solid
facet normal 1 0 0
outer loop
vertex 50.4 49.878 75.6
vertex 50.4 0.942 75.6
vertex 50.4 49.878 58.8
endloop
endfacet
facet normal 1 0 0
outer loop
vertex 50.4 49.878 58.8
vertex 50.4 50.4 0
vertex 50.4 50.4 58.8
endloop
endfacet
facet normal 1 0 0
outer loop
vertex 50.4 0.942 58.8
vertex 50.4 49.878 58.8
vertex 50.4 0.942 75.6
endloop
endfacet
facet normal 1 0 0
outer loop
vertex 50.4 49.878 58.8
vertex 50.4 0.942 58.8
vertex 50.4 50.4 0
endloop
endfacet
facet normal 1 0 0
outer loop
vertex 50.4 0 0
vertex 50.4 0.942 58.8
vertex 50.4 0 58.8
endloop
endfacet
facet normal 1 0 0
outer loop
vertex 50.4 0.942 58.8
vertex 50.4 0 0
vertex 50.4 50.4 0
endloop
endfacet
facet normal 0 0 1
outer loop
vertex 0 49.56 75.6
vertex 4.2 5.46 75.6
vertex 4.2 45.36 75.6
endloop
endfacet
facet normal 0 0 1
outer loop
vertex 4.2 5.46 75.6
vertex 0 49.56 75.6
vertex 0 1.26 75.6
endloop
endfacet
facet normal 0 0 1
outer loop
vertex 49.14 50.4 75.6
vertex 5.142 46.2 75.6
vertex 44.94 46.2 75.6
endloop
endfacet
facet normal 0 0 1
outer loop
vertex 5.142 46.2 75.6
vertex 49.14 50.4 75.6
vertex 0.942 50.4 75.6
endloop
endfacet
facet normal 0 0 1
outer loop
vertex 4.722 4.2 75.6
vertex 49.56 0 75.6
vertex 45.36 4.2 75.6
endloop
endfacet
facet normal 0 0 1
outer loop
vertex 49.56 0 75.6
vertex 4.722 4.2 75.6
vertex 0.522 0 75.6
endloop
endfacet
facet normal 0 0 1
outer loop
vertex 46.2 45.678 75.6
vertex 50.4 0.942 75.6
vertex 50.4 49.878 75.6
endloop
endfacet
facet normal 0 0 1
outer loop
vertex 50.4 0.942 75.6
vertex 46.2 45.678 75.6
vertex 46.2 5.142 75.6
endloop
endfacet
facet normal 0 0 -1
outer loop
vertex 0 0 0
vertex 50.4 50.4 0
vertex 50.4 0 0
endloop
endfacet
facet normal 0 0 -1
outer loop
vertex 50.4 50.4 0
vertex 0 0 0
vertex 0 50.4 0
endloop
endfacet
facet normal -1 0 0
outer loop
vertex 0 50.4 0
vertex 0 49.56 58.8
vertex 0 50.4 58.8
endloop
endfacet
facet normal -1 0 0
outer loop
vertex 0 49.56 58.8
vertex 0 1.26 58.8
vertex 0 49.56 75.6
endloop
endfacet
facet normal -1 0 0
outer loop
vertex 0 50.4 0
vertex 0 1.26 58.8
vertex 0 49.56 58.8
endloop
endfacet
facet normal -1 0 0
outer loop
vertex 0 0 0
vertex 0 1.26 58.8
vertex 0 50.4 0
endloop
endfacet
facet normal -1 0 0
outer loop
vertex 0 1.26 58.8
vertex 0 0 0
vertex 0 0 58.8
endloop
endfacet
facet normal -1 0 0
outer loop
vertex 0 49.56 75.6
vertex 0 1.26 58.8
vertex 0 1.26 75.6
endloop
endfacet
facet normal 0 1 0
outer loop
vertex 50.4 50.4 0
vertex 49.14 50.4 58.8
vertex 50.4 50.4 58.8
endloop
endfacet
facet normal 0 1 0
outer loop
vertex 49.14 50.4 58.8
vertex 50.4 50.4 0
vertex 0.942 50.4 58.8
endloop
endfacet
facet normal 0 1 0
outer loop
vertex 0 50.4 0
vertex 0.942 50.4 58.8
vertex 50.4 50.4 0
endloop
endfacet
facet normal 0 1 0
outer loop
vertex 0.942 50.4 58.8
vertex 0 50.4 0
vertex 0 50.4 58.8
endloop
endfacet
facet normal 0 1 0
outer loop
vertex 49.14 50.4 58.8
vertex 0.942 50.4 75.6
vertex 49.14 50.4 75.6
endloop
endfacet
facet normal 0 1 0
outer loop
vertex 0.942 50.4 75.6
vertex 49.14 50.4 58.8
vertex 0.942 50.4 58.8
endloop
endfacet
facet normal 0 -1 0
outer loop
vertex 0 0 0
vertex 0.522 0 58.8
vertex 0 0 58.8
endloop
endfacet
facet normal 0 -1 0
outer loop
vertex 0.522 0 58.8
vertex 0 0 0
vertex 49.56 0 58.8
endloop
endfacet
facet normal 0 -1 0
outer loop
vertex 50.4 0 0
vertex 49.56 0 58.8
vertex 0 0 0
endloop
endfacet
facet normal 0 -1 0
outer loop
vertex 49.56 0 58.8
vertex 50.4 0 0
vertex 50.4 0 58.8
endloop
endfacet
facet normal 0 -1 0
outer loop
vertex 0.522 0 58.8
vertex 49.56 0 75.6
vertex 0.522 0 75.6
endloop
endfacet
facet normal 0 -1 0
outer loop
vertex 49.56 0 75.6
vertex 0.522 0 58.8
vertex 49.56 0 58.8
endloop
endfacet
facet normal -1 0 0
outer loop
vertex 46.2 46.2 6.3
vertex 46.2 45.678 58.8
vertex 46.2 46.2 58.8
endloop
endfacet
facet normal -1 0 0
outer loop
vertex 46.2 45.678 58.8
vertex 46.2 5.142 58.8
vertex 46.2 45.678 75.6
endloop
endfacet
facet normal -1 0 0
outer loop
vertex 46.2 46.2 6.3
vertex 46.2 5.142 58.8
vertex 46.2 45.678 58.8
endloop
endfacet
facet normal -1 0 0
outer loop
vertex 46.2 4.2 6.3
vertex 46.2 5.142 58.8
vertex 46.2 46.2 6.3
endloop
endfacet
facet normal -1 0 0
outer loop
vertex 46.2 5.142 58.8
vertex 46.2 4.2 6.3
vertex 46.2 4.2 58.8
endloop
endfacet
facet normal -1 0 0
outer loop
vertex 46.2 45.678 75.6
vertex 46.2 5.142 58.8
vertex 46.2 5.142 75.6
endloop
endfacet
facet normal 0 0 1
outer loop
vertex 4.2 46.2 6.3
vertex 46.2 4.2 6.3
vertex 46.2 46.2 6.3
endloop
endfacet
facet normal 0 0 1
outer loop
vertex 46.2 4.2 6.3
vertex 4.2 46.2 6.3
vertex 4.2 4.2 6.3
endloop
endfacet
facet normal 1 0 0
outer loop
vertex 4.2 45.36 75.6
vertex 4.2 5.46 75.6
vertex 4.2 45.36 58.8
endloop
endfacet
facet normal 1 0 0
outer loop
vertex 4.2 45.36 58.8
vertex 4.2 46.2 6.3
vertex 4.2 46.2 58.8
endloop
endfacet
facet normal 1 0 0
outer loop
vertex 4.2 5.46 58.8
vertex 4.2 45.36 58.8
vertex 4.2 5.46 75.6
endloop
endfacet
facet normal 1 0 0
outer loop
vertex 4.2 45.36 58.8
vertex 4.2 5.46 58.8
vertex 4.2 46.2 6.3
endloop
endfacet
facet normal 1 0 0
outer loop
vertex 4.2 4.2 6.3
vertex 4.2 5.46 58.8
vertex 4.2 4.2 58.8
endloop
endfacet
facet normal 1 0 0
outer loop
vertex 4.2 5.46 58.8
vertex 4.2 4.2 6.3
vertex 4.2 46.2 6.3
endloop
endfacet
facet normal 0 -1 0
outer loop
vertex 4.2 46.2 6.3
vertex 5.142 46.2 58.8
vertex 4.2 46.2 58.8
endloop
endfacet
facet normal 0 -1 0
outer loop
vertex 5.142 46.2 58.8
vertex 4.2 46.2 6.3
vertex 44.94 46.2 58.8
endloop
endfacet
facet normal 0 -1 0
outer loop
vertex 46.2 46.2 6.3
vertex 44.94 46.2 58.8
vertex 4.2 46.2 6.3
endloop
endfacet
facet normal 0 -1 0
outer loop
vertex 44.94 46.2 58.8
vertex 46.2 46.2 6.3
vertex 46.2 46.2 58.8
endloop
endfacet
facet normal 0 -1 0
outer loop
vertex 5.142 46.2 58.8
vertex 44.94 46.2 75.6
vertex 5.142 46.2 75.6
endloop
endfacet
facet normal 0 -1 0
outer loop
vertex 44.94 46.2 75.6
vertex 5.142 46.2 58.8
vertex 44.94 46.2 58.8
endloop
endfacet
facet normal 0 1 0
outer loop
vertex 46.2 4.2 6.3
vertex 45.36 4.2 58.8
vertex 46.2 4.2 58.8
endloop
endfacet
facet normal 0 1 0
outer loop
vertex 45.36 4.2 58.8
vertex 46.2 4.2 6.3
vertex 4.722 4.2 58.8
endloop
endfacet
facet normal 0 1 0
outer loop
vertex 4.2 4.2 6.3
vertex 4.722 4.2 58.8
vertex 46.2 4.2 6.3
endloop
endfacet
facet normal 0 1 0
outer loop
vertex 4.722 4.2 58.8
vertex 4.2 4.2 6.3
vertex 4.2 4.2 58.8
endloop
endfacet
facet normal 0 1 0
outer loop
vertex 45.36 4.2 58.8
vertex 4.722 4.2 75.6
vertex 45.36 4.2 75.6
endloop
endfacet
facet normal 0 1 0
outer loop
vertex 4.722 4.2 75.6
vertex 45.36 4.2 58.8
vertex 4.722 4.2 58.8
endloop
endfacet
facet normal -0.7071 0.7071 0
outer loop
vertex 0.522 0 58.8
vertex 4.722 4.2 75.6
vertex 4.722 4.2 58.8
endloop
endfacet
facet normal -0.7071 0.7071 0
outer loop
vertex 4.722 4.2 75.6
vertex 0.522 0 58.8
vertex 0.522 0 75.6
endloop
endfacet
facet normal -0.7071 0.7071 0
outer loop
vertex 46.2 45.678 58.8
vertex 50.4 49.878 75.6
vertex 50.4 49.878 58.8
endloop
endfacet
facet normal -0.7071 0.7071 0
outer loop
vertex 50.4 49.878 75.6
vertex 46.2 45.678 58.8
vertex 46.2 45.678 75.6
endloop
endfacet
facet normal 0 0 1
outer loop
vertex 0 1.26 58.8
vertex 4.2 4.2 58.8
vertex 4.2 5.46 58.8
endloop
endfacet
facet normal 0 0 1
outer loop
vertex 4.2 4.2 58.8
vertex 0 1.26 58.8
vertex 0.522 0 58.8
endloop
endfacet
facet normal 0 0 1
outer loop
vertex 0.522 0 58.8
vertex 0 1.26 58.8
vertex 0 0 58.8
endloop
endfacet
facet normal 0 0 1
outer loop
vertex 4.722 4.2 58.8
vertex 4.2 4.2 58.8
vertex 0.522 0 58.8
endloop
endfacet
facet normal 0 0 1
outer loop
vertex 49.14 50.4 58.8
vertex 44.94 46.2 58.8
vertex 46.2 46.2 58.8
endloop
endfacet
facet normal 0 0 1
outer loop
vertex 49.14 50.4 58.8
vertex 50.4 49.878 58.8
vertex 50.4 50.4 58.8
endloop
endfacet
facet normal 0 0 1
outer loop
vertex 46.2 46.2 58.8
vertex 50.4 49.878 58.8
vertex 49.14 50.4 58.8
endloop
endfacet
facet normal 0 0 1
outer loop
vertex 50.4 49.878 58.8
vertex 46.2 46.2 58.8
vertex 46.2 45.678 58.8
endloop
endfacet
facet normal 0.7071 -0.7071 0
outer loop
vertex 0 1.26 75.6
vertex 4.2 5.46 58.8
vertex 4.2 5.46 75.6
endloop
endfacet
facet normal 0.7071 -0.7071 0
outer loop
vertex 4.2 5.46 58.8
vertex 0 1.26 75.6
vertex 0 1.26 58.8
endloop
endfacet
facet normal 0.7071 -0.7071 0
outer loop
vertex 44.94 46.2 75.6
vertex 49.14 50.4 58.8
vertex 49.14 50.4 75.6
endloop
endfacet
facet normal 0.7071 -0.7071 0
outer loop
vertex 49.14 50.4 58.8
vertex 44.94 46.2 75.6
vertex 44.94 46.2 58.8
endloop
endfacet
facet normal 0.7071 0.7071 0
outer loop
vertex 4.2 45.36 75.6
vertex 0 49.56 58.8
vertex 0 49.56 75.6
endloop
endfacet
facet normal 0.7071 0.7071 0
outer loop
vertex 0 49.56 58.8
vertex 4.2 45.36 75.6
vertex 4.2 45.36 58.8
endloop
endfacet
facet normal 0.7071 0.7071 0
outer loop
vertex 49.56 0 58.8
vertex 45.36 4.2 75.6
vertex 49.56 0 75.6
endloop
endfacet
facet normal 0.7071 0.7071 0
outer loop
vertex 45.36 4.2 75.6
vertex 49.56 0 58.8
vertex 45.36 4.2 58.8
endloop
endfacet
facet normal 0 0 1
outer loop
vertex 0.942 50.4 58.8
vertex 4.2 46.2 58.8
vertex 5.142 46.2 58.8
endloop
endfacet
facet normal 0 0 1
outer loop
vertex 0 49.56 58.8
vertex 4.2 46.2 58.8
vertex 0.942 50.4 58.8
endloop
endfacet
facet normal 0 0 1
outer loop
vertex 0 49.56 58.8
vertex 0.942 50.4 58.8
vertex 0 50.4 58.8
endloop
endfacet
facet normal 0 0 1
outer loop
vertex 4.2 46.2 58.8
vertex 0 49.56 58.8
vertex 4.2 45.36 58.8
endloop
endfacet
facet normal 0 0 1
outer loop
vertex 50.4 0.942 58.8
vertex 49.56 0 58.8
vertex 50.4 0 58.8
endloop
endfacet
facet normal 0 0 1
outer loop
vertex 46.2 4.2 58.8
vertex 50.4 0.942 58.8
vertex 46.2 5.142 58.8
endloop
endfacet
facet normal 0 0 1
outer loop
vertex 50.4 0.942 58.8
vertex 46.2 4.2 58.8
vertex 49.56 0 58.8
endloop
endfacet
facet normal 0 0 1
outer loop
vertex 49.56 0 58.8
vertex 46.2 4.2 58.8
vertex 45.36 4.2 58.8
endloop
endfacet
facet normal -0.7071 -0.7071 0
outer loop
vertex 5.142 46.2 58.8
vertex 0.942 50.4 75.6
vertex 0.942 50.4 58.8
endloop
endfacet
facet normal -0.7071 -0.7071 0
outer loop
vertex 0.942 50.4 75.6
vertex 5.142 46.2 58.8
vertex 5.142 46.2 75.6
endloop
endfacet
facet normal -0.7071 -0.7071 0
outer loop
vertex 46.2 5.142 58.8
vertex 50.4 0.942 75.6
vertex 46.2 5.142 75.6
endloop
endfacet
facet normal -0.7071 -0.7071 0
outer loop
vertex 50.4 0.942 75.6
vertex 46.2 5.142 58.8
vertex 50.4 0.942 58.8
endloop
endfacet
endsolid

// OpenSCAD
$fn=50;

scale([4.2, 4.2, 4.2]) {
    color("#1a1203") {
        difference() {
            cube([12, 12, 18]);
            #translate([1, 1, 1.5]) cube([10, 10, 18]);
            translate([-0.3, 0, 14]) { 
                #rotate([0, 0, -45]) cube([0.3, 20, 4]);
            }
            
            translate([12, -0.2, 14]) { 
                #rotate([0, 0, 45]) cube([0.3, 20, 4]);
            }
        }
    };
/*
    translate([40, 0, 0]) {
        color("silver") {
            cube([10, 14, 18]);
        };
    }

    translate([0, -40, 0]) {
        color("#414240")
        cube([10, 14, 11]);
    }
    translate([ 40, -40, 0]) {
        color("gray")
        cube([12, 10, 12]);
    }

    translate([ 20, -20, 0]) {
        color("#90664b")
        cube([ 13.5, 8, 17]);
    }
*/
}
